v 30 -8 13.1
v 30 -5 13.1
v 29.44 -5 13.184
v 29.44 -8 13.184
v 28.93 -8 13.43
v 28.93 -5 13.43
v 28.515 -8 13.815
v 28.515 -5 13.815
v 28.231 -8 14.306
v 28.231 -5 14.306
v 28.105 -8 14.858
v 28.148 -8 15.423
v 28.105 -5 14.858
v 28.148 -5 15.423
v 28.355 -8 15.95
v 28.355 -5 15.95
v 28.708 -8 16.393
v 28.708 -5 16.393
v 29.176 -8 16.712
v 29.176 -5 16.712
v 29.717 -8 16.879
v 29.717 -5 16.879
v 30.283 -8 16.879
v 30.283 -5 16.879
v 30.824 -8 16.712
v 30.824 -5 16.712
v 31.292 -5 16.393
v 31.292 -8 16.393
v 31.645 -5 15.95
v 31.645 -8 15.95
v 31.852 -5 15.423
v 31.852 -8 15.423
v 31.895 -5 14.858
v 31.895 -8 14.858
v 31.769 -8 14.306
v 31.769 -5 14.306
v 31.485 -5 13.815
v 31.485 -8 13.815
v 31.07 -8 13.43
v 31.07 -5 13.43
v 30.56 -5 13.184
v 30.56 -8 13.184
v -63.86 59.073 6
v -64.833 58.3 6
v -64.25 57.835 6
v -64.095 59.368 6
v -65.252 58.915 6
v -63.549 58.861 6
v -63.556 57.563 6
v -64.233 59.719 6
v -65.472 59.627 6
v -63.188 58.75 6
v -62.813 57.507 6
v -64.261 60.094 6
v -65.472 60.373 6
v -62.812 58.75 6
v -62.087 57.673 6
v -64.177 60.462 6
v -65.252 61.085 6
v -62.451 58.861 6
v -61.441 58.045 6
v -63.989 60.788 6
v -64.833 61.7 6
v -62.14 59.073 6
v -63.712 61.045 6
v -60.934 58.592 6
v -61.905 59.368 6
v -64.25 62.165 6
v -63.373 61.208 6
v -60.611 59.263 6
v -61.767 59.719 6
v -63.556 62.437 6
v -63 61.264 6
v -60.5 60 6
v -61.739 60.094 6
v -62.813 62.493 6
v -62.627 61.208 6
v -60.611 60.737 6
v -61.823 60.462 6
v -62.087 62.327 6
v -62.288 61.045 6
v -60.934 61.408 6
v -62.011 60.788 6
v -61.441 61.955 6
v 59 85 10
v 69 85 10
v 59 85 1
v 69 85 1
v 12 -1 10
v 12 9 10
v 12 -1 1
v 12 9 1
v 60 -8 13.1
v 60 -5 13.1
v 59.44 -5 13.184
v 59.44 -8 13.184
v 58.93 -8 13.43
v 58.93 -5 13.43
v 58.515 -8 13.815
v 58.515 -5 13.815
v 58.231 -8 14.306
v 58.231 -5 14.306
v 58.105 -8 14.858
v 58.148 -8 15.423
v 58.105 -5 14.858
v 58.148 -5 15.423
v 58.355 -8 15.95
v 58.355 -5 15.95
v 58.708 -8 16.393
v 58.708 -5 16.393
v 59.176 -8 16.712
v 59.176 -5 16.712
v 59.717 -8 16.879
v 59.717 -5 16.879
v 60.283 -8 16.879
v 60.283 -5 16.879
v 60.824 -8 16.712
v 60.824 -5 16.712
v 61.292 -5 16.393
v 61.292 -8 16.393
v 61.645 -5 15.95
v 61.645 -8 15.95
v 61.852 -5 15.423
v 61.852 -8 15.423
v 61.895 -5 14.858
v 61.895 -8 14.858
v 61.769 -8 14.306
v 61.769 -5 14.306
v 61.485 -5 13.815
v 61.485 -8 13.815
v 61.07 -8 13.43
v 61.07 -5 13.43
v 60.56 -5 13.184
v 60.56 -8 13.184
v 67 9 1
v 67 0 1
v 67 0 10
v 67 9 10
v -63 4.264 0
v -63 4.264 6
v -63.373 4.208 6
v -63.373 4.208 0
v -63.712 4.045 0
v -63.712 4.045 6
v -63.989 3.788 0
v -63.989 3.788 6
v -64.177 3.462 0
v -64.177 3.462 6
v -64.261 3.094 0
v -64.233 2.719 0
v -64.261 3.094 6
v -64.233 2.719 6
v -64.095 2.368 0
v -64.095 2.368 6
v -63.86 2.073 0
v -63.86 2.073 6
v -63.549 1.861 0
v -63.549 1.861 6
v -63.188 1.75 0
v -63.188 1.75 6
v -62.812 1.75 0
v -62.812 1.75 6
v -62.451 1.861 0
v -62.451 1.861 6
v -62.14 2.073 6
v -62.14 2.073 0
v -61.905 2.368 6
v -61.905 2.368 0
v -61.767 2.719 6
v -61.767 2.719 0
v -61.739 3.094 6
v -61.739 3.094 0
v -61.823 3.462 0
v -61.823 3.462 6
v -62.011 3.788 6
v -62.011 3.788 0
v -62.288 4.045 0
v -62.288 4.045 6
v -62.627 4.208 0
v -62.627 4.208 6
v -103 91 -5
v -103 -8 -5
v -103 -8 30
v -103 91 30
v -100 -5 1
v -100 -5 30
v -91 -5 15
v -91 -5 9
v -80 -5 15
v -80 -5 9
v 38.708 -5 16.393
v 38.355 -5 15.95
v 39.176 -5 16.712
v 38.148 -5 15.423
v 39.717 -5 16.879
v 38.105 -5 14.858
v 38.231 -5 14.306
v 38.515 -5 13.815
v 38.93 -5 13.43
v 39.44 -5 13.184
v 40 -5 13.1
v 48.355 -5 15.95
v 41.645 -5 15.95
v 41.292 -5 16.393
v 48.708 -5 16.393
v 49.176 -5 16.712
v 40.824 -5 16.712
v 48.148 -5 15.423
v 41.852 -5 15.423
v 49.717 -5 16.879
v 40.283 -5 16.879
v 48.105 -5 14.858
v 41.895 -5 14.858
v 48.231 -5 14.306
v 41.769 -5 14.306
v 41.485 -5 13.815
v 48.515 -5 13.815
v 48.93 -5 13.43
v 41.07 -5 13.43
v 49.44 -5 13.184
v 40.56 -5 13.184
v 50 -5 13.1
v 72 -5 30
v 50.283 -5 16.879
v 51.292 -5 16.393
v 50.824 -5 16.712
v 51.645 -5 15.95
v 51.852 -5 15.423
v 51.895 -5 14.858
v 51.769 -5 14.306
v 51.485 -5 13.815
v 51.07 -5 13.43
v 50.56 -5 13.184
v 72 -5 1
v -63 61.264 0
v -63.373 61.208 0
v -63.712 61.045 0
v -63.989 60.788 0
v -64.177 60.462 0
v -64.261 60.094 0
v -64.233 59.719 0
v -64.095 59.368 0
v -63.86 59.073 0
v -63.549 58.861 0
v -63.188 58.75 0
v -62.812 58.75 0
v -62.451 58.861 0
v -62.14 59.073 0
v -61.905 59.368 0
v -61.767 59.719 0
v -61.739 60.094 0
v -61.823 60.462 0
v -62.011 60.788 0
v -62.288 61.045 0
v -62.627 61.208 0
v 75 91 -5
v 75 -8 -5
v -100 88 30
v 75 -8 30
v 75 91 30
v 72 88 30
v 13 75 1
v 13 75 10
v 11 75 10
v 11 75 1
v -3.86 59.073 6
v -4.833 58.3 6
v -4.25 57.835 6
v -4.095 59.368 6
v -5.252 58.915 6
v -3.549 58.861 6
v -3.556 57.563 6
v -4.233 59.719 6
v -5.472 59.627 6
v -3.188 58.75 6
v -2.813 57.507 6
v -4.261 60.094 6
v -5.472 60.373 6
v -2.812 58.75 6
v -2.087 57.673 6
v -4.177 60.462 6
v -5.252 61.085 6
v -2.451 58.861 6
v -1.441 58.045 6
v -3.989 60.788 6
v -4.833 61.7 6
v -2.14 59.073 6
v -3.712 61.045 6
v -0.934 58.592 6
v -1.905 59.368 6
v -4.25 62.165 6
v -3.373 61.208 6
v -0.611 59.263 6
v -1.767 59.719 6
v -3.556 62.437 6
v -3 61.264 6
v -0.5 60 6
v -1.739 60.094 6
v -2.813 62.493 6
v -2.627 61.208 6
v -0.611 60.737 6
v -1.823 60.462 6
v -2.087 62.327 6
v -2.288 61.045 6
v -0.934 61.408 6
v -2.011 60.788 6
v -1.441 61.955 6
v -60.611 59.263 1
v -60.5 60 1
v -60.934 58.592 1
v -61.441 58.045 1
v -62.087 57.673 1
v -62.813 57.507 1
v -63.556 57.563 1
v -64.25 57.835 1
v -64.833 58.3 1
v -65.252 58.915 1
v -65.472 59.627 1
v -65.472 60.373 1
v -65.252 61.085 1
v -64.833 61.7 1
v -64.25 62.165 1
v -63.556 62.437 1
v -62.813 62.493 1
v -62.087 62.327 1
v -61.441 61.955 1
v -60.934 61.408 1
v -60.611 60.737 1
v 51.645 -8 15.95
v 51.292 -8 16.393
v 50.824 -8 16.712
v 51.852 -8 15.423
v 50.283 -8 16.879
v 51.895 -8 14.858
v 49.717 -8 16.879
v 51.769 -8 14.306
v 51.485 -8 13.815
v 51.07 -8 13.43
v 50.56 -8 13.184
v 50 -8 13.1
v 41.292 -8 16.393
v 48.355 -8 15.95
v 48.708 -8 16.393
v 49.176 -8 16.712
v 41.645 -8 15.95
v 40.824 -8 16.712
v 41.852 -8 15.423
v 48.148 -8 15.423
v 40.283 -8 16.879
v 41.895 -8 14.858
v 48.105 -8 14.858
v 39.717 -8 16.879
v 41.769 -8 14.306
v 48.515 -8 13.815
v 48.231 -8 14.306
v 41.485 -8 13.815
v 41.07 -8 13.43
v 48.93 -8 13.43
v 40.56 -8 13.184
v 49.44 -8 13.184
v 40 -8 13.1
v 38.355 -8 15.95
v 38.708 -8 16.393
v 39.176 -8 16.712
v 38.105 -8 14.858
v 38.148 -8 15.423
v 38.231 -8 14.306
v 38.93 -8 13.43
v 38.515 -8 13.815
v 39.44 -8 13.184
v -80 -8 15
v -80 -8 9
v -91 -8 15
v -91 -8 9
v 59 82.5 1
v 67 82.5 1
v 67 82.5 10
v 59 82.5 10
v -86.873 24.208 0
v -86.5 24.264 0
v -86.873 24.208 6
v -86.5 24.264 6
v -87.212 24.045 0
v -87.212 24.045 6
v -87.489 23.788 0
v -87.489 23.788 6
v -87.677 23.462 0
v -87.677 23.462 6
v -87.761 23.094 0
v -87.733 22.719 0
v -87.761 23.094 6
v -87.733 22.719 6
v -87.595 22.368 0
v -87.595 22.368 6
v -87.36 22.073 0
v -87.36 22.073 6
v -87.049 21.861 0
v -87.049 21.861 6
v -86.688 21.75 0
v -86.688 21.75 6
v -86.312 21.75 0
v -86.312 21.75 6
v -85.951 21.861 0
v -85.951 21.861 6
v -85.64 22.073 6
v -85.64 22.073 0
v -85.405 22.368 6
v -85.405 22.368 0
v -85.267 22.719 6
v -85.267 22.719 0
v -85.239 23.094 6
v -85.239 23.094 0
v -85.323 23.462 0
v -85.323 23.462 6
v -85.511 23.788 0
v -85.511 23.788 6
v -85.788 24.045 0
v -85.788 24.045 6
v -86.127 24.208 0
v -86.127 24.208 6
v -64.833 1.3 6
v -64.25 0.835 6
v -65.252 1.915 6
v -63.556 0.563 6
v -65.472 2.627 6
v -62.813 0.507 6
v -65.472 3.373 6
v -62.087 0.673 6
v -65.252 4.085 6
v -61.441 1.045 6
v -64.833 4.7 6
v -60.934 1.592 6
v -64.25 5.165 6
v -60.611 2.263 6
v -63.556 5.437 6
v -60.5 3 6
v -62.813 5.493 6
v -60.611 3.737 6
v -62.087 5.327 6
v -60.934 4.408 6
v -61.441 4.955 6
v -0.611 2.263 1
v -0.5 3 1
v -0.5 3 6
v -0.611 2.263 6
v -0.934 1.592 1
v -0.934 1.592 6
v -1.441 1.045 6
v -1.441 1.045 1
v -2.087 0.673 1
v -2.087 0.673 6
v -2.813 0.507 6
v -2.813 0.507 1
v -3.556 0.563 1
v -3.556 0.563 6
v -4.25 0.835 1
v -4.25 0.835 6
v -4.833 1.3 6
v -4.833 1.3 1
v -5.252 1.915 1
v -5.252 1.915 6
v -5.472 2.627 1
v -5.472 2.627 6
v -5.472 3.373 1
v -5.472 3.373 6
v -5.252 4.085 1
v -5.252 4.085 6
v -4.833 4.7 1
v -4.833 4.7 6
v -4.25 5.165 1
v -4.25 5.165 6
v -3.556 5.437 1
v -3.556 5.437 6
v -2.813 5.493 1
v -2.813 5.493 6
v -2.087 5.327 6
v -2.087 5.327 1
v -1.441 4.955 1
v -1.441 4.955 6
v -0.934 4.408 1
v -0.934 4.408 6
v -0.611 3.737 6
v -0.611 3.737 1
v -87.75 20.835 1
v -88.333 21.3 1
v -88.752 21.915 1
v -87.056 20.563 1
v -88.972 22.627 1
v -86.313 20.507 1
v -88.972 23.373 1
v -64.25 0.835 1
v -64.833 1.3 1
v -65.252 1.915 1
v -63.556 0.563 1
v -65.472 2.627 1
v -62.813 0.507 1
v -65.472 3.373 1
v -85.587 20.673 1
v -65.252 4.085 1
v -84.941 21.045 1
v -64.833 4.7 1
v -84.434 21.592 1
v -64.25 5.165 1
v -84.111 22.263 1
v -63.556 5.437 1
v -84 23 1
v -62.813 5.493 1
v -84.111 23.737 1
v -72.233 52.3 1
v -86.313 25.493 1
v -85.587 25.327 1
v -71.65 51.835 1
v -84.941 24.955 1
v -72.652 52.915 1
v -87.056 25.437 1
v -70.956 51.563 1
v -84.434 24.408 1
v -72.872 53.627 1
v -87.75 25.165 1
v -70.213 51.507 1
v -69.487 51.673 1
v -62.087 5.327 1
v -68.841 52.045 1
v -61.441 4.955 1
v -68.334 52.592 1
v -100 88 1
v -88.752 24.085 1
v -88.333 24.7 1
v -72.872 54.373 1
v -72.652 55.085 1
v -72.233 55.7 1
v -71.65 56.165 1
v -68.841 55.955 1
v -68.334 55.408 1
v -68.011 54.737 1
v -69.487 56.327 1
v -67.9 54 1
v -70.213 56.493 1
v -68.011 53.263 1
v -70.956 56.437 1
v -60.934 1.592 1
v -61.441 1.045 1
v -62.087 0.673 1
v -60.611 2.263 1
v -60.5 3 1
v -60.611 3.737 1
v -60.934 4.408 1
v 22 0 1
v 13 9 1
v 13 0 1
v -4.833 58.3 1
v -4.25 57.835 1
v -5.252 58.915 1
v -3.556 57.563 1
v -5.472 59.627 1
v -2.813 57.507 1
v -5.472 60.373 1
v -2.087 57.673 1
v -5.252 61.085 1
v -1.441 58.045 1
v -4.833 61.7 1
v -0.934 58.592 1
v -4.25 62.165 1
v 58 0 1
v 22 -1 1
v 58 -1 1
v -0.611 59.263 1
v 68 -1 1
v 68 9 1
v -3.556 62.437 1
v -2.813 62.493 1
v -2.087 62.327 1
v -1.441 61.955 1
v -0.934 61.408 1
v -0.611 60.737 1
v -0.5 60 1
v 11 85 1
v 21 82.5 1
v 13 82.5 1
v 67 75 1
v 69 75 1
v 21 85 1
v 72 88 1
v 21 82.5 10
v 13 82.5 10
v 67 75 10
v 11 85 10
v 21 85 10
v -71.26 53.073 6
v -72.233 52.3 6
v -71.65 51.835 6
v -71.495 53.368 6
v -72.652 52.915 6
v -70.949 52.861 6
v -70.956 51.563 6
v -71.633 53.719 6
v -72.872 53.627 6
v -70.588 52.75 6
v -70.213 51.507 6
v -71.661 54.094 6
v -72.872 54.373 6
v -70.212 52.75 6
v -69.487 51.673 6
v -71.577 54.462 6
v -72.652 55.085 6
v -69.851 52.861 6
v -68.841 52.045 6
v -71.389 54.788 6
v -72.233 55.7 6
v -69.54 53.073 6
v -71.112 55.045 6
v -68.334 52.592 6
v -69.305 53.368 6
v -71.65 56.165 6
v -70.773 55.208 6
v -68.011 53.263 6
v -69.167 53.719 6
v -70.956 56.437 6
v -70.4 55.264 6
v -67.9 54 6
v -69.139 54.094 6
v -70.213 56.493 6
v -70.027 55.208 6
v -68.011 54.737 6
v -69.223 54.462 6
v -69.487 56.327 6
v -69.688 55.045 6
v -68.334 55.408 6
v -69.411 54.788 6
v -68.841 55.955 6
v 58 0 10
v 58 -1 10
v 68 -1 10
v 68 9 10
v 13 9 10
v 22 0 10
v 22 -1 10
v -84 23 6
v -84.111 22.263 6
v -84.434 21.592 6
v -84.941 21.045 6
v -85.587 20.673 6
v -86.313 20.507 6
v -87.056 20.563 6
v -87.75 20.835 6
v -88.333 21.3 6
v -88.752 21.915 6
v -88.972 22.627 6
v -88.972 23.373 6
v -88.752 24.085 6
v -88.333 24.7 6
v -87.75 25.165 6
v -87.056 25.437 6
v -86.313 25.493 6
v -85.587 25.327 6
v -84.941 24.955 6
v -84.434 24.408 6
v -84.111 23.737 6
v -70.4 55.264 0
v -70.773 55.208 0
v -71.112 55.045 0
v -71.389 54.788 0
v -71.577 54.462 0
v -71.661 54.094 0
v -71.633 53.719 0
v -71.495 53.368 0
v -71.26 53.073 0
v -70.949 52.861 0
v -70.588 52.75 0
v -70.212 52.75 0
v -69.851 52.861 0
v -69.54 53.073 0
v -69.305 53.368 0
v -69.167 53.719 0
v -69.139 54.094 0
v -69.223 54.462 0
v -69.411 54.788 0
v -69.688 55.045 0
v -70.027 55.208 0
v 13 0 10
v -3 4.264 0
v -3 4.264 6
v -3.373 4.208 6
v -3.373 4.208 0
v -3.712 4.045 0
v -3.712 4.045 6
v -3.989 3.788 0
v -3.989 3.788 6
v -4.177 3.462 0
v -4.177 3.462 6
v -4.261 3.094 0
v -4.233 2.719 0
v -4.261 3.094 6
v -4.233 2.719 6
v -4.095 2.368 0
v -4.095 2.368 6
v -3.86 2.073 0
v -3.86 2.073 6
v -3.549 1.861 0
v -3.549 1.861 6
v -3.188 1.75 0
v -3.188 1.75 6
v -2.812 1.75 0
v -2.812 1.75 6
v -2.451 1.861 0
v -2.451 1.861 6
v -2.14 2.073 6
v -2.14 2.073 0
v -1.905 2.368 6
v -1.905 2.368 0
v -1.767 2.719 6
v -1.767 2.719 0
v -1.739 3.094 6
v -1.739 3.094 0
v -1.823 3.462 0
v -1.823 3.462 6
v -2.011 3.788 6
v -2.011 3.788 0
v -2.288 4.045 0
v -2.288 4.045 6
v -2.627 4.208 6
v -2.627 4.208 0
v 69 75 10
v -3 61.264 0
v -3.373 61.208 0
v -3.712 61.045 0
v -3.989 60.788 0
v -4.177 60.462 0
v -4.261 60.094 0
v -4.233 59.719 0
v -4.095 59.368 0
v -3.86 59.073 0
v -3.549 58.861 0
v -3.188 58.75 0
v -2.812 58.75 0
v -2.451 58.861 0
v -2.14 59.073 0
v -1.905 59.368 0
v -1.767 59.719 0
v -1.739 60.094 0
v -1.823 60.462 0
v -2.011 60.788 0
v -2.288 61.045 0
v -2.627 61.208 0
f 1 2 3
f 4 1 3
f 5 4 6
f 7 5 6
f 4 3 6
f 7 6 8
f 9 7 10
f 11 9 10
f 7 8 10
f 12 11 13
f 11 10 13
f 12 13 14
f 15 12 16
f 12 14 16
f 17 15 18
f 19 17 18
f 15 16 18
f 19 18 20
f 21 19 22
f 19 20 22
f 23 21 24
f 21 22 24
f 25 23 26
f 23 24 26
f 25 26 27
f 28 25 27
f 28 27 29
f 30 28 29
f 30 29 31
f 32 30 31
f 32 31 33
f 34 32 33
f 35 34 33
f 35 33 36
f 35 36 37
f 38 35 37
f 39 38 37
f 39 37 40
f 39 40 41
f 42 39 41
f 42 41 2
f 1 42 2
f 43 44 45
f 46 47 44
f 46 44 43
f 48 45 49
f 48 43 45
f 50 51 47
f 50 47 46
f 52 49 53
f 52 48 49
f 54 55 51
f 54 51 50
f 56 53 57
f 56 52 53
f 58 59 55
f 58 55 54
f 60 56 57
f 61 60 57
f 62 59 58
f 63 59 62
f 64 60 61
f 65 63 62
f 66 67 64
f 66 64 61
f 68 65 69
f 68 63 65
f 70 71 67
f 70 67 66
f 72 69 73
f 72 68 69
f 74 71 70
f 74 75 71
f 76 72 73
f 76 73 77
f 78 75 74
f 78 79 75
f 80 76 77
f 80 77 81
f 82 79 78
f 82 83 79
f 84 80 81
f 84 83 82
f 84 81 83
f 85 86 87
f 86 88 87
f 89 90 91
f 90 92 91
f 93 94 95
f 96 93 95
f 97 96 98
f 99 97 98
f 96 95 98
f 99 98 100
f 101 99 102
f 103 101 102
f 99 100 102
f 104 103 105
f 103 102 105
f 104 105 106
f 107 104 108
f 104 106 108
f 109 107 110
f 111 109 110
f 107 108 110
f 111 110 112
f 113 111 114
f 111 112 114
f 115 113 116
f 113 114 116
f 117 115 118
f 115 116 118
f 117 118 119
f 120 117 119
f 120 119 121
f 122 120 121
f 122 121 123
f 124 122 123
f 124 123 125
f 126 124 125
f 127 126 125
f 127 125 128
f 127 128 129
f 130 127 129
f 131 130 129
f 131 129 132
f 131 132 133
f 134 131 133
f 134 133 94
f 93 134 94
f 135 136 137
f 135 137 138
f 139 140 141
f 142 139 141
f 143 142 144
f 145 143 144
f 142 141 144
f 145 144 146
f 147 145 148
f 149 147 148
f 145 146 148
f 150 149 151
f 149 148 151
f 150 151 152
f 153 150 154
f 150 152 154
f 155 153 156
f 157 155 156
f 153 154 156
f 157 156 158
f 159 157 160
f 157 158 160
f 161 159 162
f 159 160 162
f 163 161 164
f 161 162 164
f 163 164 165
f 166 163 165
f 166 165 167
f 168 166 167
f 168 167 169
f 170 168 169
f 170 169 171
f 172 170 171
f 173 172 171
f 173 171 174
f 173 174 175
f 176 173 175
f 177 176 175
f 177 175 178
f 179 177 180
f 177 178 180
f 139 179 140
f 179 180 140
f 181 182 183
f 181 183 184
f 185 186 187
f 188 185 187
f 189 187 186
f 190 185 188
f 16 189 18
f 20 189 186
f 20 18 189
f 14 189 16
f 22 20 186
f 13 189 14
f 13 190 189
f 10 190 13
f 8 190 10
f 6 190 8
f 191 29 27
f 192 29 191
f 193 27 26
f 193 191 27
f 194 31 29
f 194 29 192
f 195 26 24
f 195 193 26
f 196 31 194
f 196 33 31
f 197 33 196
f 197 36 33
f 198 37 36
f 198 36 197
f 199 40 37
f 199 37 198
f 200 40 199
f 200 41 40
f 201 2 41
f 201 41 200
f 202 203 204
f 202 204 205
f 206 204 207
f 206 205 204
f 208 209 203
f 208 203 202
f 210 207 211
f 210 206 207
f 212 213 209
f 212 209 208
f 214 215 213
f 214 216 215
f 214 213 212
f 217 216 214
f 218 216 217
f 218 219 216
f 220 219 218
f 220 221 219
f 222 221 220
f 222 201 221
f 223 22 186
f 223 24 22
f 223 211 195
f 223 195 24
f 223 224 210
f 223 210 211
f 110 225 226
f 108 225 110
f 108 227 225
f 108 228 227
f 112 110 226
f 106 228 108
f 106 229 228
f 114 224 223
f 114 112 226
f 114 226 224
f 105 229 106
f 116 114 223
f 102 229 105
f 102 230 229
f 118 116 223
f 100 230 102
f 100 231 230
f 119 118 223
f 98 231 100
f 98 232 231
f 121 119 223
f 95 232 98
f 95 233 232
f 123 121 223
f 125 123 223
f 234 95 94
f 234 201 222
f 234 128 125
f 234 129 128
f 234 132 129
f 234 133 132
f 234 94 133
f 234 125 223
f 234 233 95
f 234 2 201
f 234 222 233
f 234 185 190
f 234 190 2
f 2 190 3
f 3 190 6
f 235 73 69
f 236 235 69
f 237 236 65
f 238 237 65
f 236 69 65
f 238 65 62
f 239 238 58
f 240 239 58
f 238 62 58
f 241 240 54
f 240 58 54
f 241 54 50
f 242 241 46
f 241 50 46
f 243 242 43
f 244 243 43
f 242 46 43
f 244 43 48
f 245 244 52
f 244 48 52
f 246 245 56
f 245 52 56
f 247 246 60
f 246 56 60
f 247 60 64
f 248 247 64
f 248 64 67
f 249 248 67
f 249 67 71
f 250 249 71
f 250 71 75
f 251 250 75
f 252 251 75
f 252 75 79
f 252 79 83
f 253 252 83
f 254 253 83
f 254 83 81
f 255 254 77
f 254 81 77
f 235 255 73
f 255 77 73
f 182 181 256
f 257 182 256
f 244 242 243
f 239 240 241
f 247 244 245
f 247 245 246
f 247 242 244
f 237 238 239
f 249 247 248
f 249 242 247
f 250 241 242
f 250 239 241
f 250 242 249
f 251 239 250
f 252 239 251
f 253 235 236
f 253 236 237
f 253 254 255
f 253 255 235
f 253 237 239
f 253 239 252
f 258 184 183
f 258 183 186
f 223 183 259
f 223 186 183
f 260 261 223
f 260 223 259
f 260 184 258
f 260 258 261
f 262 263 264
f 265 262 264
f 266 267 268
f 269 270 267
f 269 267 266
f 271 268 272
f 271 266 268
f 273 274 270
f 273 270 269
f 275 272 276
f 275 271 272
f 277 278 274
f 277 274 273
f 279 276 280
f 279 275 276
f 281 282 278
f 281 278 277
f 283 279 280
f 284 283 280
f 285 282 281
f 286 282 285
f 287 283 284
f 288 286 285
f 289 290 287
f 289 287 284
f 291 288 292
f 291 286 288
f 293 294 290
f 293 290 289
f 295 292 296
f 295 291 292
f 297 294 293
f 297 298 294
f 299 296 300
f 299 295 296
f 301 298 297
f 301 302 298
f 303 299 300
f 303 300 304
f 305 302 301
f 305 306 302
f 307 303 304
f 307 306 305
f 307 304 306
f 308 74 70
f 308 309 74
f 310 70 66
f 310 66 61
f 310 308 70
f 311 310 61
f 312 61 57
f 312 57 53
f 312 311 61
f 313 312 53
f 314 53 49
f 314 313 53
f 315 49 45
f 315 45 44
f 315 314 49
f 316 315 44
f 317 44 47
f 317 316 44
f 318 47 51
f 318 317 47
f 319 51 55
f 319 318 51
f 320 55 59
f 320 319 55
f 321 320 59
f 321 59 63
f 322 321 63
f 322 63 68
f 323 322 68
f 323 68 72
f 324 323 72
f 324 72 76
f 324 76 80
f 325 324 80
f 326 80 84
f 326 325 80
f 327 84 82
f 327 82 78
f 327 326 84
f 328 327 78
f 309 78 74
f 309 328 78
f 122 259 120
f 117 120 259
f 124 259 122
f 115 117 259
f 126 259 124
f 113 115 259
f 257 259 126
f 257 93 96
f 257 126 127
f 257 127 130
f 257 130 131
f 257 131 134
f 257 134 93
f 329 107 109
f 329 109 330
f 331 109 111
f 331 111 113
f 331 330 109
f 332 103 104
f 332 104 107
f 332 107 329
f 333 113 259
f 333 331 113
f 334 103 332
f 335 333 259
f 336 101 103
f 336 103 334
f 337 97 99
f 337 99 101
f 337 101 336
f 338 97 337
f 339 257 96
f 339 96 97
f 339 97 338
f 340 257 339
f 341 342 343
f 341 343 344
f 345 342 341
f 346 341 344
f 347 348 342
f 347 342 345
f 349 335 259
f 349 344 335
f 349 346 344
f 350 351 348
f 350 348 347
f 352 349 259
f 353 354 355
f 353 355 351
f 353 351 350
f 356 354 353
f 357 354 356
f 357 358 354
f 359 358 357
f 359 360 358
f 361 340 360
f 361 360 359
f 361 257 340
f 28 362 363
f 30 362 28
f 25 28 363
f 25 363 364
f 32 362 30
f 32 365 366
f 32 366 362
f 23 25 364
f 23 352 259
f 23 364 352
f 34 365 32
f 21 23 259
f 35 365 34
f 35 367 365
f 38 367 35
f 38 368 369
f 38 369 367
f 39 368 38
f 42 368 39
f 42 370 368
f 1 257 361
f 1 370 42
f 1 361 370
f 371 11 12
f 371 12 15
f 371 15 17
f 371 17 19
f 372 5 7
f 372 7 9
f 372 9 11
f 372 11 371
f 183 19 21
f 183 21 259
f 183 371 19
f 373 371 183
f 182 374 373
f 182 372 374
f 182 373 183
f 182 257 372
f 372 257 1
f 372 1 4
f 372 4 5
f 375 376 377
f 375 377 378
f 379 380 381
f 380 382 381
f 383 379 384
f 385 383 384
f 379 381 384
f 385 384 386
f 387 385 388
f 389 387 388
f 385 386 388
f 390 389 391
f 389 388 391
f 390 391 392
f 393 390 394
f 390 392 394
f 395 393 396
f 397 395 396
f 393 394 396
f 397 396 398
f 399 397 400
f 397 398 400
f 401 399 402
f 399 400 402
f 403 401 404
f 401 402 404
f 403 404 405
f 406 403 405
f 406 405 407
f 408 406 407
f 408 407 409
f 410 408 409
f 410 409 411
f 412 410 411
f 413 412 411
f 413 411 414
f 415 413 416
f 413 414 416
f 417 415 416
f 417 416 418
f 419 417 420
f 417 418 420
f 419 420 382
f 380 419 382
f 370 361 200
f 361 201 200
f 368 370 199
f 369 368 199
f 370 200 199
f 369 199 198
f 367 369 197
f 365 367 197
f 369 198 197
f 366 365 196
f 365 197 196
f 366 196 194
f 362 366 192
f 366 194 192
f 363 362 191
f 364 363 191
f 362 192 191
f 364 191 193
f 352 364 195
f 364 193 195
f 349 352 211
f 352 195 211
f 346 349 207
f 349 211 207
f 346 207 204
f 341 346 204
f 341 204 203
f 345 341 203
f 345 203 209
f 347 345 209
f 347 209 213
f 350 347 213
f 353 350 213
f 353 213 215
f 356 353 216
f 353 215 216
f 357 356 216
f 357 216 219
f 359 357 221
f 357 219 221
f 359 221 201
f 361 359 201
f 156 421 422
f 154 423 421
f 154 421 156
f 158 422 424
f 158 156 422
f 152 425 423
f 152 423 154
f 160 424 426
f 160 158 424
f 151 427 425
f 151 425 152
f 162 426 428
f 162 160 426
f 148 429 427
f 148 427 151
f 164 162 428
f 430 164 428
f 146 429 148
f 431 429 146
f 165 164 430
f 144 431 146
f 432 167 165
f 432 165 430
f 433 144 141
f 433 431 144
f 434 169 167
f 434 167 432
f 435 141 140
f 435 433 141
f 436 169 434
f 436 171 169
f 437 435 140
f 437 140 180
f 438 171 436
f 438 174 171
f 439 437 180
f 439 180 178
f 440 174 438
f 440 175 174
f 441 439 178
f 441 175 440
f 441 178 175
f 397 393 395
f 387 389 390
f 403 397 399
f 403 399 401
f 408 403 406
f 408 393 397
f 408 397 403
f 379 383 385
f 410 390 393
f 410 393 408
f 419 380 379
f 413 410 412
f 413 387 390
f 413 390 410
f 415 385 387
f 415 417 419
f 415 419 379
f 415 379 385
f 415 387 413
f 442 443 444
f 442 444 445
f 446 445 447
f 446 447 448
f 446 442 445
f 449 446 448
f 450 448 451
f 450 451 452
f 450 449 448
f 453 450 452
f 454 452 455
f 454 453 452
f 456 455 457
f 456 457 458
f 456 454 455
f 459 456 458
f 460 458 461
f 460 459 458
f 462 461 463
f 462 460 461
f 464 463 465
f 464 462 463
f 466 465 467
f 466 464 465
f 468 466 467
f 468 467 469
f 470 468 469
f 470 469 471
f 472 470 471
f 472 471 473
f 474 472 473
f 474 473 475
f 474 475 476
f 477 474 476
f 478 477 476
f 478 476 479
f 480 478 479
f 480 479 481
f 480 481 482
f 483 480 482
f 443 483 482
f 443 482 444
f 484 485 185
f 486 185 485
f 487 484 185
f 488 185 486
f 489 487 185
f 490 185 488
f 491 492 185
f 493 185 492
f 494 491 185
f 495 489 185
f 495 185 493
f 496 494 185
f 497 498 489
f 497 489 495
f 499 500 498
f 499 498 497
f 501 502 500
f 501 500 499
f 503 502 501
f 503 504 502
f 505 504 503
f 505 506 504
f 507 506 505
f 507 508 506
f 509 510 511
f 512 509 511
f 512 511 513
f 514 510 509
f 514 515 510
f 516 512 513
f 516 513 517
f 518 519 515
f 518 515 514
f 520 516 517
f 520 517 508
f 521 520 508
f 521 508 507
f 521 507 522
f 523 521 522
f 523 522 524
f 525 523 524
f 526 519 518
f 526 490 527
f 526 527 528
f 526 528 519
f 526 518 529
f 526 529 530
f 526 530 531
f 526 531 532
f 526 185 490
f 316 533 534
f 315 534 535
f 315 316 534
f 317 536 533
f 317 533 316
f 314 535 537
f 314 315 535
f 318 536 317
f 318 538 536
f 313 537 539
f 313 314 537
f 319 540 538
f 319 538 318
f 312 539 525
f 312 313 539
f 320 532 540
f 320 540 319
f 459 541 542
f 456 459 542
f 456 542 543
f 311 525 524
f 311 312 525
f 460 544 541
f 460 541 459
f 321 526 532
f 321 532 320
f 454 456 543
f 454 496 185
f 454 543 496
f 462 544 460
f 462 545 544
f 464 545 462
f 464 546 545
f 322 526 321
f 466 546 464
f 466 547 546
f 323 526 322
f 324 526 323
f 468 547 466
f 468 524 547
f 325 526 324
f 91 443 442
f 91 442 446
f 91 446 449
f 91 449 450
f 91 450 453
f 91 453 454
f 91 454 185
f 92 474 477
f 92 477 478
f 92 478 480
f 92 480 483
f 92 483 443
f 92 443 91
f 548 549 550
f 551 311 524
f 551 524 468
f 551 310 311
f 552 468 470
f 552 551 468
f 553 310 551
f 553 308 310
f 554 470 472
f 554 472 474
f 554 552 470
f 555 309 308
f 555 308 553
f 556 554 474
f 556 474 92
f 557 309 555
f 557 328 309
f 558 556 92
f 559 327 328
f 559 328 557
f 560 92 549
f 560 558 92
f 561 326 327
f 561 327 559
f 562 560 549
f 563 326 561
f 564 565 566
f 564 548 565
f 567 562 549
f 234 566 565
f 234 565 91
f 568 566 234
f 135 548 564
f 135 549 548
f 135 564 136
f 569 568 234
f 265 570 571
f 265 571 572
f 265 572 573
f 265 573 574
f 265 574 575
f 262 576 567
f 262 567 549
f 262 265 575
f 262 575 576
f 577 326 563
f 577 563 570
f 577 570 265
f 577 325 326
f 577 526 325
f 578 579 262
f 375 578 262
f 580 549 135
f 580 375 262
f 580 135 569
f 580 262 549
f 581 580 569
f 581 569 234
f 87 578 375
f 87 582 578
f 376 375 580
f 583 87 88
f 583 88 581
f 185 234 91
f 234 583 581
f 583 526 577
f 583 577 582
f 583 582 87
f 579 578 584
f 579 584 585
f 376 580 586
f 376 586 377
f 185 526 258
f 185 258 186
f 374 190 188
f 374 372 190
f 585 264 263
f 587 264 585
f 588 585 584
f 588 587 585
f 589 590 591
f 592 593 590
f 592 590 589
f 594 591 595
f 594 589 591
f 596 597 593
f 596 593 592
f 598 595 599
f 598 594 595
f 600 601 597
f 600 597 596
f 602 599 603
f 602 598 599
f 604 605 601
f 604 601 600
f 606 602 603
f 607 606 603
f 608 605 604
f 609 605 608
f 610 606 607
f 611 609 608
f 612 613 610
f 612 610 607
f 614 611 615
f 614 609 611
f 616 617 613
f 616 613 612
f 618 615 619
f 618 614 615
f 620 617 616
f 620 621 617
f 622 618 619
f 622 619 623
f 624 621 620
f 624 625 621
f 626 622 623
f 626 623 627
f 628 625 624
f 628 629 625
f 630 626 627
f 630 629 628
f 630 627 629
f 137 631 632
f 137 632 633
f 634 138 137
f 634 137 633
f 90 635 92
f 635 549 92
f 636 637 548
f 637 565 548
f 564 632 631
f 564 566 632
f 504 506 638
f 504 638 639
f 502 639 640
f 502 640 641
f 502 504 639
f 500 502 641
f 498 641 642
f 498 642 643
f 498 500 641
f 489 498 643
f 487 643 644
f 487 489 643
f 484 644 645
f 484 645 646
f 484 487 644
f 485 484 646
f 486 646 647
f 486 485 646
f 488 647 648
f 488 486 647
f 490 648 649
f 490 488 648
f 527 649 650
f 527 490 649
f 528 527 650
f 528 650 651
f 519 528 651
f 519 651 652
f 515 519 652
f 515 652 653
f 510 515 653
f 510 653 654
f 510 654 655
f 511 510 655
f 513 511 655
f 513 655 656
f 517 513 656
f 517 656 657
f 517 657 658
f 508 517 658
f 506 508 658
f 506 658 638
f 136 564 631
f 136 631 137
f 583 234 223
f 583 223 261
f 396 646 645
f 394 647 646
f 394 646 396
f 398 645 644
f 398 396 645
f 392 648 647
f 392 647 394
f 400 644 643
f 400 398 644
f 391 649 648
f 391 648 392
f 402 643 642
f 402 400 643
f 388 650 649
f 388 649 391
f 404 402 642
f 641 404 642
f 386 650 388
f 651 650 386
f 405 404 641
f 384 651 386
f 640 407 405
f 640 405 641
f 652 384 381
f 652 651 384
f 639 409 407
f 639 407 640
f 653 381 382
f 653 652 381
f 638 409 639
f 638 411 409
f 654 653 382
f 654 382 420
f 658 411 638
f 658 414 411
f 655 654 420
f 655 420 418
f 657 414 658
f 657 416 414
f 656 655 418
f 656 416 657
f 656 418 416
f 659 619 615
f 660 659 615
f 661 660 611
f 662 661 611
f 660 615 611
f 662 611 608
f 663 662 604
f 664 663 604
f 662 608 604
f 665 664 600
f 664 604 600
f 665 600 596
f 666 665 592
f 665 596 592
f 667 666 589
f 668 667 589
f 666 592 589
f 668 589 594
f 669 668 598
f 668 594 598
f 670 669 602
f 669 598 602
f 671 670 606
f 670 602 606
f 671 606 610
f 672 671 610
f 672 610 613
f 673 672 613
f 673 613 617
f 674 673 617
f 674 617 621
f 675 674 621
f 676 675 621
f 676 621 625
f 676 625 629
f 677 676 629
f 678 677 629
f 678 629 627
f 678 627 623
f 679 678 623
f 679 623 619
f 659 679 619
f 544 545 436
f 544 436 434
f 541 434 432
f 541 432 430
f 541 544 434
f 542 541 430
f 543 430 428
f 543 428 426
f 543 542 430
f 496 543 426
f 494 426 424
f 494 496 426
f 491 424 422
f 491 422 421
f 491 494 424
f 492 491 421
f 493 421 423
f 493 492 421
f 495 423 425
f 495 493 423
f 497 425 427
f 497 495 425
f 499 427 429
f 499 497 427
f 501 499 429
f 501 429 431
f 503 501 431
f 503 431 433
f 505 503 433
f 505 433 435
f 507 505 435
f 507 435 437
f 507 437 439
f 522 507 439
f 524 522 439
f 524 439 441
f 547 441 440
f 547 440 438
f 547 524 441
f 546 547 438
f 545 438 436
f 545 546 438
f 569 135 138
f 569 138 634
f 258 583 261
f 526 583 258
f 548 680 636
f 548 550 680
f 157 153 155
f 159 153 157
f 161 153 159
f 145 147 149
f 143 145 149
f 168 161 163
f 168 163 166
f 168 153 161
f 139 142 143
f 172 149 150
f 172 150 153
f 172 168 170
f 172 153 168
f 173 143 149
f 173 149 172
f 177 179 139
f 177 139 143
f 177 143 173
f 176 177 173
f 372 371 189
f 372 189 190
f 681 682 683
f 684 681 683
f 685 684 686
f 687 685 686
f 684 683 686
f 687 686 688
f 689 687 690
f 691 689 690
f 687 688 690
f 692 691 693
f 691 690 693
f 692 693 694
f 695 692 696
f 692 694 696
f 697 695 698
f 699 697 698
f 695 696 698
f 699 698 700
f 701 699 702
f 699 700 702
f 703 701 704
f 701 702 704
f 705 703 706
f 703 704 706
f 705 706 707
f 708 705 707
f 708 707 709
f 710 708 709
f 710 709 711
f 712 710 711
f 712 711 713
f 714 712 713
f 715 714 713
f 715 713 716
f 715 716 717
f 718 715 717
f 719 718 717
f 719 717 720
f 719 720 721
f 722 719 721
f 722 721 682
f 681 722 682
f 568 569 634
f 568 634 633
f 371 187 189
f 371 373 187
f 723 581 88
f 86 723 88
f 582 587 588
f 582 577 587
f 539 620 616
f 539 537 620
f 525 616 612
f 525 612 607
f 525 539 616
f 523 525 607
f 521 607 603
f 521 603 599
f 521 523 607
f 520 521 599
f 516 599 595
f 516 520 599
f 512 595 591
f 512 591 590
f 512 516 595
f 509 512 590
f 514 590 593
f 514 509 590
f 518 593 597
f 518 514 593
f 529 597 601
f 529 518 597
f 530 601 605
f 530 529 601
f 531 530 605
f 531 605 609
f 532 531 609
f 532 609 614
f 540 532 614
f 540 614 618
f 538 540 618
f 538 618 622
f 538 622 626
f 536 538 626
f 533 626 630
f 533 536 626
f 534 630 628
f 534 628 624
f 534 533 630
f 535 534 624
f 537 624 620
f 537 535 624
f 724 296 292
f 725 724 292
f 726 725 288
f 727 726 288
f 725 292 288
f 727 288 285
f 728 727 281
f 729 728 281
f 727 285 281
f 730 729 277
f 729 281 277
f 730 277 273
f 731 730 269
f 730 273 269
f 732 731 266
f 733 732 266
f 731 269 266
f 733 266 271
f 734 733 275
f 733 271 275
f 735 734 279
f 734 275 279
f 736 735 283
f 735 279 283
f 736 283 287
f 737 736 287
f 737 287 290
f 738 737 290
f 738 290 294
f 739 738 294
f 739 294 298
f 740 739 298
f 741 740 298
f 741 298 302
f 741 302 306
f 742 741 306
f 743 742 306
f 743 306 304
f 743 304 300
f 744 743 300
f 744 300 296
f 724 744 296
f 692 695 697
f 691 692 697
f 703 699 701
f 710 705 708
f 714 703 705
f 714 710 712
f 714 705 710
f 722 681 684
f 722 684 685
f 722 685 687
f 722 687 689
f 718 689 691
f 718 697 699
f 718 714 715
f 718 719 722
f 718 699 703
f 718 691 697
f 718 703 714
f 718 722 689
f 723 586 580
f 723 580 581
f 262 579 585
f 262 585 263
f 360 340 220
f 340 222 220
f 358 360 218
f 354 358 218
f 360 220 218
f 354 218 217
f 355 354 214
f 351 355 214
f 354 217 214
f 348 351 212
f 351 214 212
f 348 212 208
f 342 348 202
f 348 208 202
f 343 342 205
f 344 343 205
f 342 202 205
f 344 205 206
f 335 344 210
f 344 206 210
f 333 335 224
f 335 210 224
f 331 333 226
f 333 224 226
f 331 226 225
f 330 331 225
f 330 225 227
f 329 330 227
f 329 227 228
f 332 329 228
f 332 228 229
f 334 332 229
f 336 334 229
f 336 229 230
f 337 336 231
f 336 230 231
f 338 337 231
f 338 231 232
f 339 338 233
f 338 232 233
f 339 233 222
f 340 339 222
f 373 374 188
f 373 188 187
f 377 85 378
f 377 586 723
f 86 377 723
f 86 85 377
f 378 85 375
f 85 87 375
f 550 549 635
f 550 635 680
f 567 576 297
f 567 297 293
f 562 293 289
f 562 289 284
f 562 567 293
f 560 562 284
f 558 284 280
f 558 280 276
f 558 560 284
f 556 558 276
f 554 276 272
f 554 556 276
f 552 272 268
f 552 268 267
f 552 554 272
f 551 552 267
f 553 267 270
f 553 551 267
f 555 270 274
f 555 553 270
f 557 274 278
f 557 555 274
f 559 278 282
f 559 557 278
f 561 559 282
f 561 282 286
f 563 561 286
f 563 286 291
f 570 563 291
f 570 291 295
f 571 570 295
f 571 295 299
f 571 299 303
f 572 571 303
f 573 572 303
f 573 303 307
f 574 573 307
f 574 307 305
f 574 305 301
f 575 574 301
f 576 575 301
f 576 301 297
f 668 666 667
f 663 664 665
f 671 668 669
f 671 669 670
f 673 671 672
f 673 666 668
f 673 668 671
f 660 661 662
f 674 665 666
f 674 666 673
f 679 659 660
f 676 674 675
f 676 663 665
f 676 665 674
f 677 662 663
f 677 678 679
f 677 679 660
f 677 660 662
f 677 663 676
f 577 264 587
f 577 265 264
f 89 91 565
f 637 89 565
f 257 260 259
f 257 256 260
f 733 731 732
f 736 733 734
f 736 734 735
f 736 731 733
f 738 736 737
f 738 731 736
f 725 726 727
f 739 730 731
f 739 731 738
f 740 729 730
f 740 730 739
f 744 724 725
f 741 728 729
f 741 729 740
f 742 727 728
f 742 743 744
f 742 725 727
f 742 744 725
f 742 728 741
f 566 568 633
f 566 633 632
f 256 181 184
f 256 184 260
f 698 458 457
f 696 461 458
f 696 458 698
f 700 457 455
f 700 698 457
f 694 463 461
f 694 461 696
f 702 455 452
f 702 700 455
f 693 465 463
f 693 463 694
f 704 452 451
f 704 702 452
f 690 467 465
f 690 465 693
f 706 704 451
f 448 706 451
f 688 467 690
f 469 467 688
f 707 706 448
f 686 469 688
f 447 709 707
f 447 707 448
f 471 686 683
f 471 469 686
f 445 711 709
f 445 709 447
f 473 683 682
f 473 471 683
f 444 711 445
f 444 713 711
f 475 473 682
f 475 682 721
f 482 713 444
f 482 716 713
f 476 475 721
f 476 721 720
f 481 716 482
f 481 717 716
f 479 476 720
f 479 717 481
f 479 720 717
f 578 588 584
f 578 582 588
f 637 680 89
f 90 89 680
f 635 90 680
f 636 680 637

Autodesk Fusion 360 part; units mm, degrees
sketch "ESP32 Devkit Board" plane through (0, 0, 0) normal (0, 0, 1) x (1, 0, 0)
  line L0 (0, 0) -> (-66, 0)
  line L1 (-66, 0) -> (-66, 63)
  line L2 (-66, 63) -> (0, 63)
  line L3 (0, 63) -> (0, 0)
  circle A0 centre (-63, 60) radius 1.5
  circle A1 centre (-3, 60) radius 1.5
  circle A2 centre (-3, 3) radius 1.5
  circle A3 centre (-63, 3) radius 1.5
  line L4 (-67.9, 17) -> (-89, 17)
  line L5 (-89, 17) -> (-89, 60)
  line L6 (-89, 60) -> (-67.9, 60)
  line L7 (-67.9, 60) -> (-67.9, 17)
  circle A4 centre (-70.4, 54) radius 1.5
  circle A5 centre (-86.5, 23) radius 1.5
  line L8 (13, 0) -> (67, 0)
  line L9 (67, 0) -> (67, 82.5)
  line L10 (67, 82.5) -> (13, 82.5)
  line L11 (13, 82.5) -> (13, 0)
  line L12 (-100, -5) -> (72, -5)
  line L13 (72, -5) -> (72, 88)
  line L14 (72, 88) -> (-100, 88)
  line L15 (-100, 88) -> (-100, -5)
  line L16 (12, -1) -> (22, -1)
  line L17 (22, -1) -> (22, 9)
  line L18 (22, 9) -> (12, 9)
  line L19 (12, 9) -> (12, -1)
  line L20 (68, -1) -> (58, -1)
  line L21 (58, -1) -> (58, 9)
  line L22 (58, 9) -> (68, 9)
  line L23 (68, 9) -> (68, -1)
  line L24 (69, 85) -> (59, 85)
  line L25 (59, 85) -> (59, 75)
  line L26 (59, 75) -> (69, 75)
  line L27 (69, 75) -> (69, 85)
  line L28 (11, 85) -> (21, 85)
  line L29 (21, 85) -> (21, 75)
  line L30 (21, 75) -> (11, 75)
  line L31 (11, 75) -> (11, 85)
  line L32 (-103, 91) -> (75, 91)
  line L33 (75, 91) -> (75, -8)
  line L34 (75, -8) -> (-103, -8)
  line L35 (-103, -8) -> (-103, 91)
  dimension "d1" = 66
  dimension "d2" = 63
  dimension "d3" = 3
  dimension "d4" = 3
  dimension "d5" = 3
  dimension "d6" = 3
  dimension "d7" = 3
  dimension "d8" = 3
  dimension "d9" = 3
  dimension "d10" = 3
  dimension "d11" = 3
  dimension "d12" = 3
  dimension "d13" = 3
  dimension "d14" = 3
  dimension "d15" = 21.1
  dimension "d16" = 43
  dimension "d17" = 3
  dimension "d18" = 6
  dimension "d19" = 2.5
  dimension "d20" = 3
  dimension "d21" = 2.5
  dimension "d22" = 6
  dimension "d23" = 54
  dimension "d24" = 82.5
  dimension "d69" = 10
  dimension "d70" = 10
  dimension "d71" = 10
  dimension "d72" = 10
  dimension "d73" = 10
  dimension "d74" = 10
  dimension "d75" = 10
  dimension "d76" = 10
extrude "Extrude1" add sketch "ESP32 Devkit Board" along normal blind 1 contours L0 L1 L2 L3 | A0 | A1 | A2 | A3 | L4 L5 L6 L7 | A4 | A5 | L8 L11 L17 L18 | L8 L11 L16 L17 L18 L19 | L8 L9 L10 L11 L17 L18 L21 L22 L25 L26 L29 L30 | L8 L9 L21 L22 | L8 L9 L20 L21 L22 L23 | L10 L11 L28 L29 L30 L31 | L10 L11 L29 L30 | L9 L10 L25 L26 | L9 L10 L24 L25 L26 L27 | L12 L13 L14 L15 makes body 1
extrude "Extrude2" add sketch "ESP32 Devkit Board" along normal blind 6 separate body contours A4 makes body 2
extrude "Extrude3" add sketch "ESP32 Devkit Board" along normal blind 6 separate body contours A5 makes body 3
extrude "Extrude4" add sketch "ESP32 Devkit Board" along normal blind 6 separate body contours A0 | A1 | A2 | A3 makes body 4 at (-4.3173, 60.7174, 4) makes body 5 at (-1.5019, 2.9252, 4) makes body 6 at (-61.7201, 60.7822, 4) makes body 7 at (-62.5937, 4.4439, 4)
move_face "OffsetFaces1" offset 1 1 faces at (-85.5075, 24.1247, 4) on bodies 3
move_face "OffsetFaces2" offset 1 1 faces at (-62.5937, 4.4439, 4) on bodies 7
move_face "OffsetFaces3" offset 1 1 faces at (-69.4075, 55.1247, 4) on bodies 2
move_face "OffsetFaces4" offset 1 1 faces at (-61.7201, 60.7822, 4) on bodies 6
move_face "OffsetFaces5" offset 1 1 faces at (-4.3173, 60.7174, 4) on bodies 4
move_face "OffsetFaces6" offset 1 1 faces at (-1.5019, 2.9252, 4) on bodies 5
hole "Hole1" at (-63, 60, 0) direction (0, 0, 1) diameter 2.529 depth 16 tip angle 118 bodies 1 6
hole "Hole2" at (-3, 60, 0) direction (0, 0, 1) diameter 2.529 depth 16 tip angle 118 bodies 1 4
hole "Hole3" at (-86.5, 23, 0) direction (0, 0, 1) diameter 2.529 depth 29 tip angle 118 bodies 1 3
hole "Hole4" at (-70.4, 54, 0) direction (0, 0, 1) diameter 2.529 depth 29 tip angle 118 bodies 1 2
hole "Hole5" at (-3, 3, 0) direction (0, 0, 1) diameter 2.529 depth 29 tip angle 118 bodies 1 5
hole "Hole6" at (-63, 3, 0) direction (0, 0, 1) diameter 2.529 depth 29 tip angle 118 bodies 1 7
extrude "Extrude5" add sketch "ESP32 Devkit Board" along normal blind 10 separate body contours L8 L11 L16 L17 L18 L19 | L8 L9 L20 L21 L22 L23 | L10 L11 L28 L29 L30 L31 | L9 L10 L24 L25 L26 L27 makes body 8 at (65.6667, 85, 3.3333) makes body 9 at (15.3333, -1, 3.3333) makes body 10 at (68, 5.6667, 3.3333) makes body 11 at (11, 78.3333, 3.3333)
extrude "Extrude6" add sketch "ESP32 Devkit Board" along normal blind 30 contours L32 L33 L34 L35 bodies 1
sketch "Sketch2" plane through (0, -8, 0) normal (0, -1, 0) x (1, 0, 0)
  line L0 (-103, 0) -> (75, 0)
  line L1 (75, 0) -> (75, 30)
  line L2 (75, 30) -> (-103, 30)
  line L3 (-103, 30) -> (-103, 0)
  circle A0 centre (60, 15) radius 1.4142
  circle A1 centre (50, 15) radius 1
  circle A2 centre (40, 15) radius 1.4923
  circle A3 centre (30, 15) radius 1.4142
  line L4 (-91, 15) -> (-80, 15)
  line L5 (-80, 15) -> (-80, 9)
  line L6 (-80, 9) -> (-91, 9)
  line L7 (-91, 9) -> (-91, 15)
  dimension "d81" = 11
  dimension "d82" = 6
hole "Hole7" at (30, -8, 15) at (40, -8, 15) at (50, -8, 15) at (60, -8, 15) direction (0, 1, 0) diameter 3.8 depth 3 tip angle 118 bodies 1
extrude "Extrude7" cut sketch "Sketch2" against normal blind 9 contours L4 L5 L6 L7 bodies 1
extrude "Extrude8" add sketch "ESP32 Devkit Board" against normal blind 5 contours L0 L1 L2 L3 | A0 | A1 | A2 | A3 | L4 L5 L6 L7 | A4 | A5 | L8 L11 L17 L18 | L8 L11 L16 L17 L18 L19 | L8 L9 L10 L11 L17 L18 L21 L22 L25 L26 L29 L30 | L8 L9 L21 L22 | L8 L9 L20 L21 L22 L23 | L10 L11 L28 L29 L30 L31 | L10 L11 L29 L30 | L9 L10 L25 L26 | L9 L10 L24 L25 L26 L27 | L12 L13 L14 L15 | L32 L33 L34 L35 bodies 1 2 3 4 5 6 7 8 9 10 11
